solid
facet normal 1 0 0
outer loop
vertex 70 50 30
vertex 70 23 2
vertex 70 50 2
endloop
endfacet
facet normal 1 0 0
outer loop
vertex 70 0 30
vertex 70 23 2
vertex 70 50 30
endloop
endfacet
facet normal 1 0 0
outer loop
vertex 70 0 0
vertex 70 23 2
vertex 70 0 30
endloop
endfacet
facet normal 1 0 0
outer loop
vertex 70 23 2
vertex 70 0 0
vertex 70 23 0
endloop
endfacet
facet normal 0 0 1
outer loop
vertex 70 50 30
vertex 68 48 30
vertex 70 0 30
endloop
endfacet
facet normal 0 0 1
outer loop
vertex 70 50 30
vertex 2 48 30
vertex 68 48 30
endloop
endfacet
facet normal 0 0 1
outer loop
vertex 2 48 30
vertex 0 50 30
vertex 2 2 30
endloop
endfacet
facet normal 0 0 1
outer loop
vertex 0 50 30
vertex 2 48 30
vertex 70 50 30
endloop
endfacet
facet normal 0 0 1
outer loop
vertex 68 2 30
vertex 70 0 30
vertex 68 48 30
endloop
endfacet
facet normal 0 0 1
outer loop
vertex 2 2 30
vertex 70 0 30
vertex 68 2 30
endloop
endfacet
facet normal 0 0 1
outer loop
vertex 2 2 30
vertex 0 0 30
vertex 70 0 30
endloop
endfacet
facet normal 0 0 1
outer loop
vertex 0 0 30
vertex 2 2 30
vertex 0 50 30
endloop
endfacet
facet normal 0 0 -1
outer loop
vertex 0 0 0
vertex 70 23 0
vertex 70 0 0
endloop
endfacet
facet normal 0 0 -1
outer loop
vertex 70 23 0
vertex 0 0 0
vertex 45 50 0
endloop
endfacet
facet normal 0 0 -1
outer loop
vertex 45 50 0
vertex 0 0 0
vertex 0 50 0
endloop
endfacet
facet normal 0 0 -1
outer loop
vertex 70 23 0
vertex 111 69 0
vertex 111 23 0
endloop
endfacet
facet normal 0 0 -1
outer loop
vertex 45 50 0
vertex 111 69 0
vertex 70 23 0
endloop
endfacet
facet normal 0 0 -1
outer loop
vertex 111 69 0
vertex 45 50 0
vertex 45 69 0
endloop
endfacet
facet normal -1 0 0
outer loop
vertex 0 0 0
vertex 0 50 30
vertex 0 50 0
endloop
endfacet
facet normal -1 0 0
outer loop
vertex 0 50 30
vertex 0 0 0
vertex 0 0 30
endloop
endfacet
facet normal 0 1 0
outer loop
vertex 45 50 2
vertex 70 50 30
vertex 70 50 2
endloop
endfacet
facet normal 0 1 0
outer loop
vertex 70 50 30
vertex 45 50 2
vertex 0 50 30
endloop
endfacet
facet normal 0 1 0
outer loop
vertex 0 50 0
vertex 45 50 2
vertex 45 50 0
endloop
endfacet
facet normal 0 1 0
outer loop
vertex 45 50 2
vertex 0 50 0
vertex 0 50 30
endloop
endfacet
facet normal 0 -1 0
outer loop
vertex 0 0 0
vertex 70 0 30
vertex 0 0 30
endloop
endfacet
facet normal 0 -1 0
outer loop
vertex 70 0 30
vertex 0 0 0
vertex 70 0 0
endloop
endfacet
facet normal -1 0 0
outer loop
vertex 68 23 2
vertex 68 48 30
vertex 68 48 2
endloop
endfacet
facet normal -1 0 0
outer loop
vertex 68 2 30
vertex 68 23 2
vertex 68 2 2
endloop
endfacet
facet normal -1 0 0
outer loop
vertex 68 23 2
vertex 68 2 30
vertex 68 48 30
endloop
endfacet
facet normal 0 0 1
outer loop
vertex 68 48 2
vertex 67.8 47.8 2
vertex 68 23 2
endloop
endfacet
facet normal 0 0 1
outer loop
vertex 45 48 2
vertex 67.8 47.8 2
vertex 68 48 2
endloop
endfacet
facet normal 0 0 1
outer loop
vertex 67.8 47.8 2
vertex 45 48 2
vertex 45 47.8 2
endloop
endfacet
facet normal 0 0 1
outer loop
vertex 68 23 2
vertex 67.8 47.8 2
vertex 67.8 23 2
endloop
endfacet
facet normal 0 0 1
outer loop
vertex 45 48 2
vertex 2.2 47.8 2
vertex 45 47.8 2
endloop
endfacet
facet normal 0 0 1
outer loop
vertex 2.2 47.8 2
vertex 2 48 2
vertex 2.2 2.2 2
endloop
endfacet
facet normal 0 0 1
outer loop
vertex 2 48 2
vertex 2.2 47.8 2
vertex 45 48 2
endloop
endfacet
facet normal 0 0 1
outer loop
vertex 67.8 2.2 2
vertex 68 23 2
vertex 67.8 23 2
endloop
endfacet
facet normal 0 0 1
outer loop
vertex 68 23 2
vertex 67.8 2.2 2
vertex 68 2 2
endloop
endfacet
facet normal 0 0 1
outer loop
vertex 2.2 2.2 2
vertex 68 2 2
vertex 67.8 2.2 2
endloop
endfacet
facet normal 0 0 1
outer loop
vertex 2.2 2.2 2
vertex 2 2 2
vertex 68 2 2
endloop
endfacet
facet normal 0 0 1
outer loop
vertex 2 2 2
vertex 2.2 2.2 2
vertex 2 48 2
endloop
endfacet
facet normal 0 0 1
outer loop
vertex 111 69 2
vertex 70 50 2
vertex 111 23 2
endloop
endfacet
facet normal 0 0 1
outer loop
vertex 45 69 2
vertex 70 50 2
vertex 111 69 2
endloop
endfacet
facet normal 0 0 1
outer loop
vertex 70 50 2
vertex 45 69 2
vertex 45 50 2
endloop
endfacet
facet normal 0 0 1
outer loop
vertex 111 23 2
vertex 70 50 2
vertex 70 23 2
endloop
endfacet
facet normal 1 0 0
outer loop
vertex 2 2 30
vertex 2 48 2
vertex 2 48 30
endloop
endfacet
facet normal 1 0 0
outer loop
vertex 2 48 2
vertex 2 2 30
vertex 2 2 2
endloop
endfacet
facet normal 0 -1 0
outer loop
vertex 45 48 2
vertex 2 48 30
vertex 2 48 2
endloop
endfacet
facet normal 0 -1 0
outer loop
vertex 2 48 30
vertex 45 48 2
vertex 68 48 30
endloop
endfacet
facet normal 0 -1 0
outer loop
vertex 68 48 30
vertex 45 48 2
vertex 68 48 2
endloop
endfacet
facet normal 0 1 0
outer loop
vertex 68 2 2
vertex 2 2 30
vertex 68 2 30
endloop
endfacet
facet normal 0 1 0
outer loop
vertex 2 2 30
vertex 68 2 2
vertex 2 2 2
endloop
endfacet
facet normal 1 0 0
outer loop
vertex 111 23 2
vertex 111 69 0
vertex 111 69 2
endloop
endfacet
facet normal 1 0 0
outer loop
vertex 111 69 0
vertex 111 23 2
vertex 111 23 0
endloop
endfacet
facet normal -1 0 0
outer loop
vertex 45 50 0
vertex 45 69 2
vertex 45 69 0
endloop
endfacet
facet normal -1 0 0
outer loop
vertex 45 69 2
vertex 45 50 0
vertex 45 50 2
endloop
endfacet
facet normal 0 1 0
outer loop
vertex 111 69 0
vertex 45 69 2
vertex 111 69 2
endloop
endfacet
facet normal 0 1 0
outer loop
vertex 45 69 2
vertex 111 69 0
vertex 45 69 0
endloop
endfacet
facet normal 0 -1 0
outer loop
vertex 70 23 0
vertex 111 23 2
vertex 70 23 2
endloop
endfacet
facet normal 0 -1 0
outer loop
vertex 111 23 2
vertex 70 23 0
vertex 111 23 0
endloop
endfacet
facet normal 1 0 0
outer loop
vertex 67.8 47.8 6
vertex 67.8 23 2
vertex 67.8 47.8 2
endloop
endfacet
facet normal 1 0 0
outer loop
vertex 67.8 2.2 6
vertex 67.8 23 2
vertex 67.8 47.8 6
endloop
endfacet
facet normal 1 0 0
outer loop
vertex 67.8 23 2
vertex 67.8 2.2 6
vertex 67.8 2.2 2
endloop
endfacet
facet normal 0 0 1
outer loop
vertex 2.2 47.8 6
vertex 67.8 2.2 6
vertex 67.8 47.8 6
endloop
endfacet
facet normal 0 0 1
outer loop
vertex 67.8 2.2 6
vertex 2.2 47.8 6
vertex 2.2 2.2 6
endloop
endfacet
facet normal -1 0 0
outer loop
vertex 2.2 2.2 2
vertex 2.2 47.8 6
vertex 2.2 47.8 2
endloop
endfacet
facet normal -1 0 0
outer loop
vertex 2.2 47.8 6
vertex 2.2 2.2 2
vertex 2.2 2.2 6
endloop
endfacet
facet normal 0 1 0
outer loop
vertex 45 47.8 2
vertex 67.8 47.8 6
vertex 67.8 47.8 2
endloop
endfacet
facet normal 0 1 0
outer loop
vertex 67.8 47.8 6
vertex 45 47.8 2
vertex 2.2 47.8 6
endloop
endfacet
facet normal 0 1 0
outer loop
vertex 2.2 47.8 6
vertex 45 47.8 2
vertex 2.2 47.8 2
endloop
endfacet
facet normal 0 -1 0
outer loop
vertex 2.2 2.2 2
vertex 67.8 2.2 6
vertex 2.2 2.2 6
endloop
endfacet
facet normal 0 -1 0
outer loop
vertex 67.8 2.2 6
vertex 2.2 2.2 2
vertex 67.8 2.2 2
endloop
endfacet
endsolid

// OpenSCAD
// Two-part enclosure for small electronics board
// Print orientation: box standing on bed, lid printed upside down on +X side

// ---- Box parameters ----
box_x = 70;      // outer length (X)
box_y = 50;      // outer width (Y)
box_z = 30;      // outer height (Z)
box_w = 2;       // wall thickness
box_f = 2;       // floor thickness

// ---- Lid parameters ----
lip_t = 1.5;     // lip wall thickness
lip_h = 4;       // lip height
lip_x = 65.6;    // outer lip length (X)
lip_y = 45.6;    // outer lip width (Y)
clear = 0.2;     // clearance between lip and box opening

// ---- Misc ----
eps = 0.5;       // cutter overshoot
$fn = 64;

// Derived
inner_x = box_x - 2 * box_w;
inner_y = box_y - 2 * box_w;
plate_x = lip_x + 2 * clear;
plate_y = lip_y + 2 * clear;

union() {
    // Box
    difference() {
        cube([box_x, box_y, box_z]);
        translate([box_w, box_w, box_f])
            cube([inner_x, inner_y, box_z - box_f]);
    }

    // Lid (upside down: plate on bed, lip pointing up into box)
    union() {
        translate([box_x / 2 + 10, plate_y / 2, 0])
            cube([plate_x, plate_y, 2]);  // plate
        translate([box_x / 2 - lip_x / 2, box_y / 2 - lip_y / 2, 2])
            cube([lip_x, lip_y, lip_h]);  // lip
    }
}
